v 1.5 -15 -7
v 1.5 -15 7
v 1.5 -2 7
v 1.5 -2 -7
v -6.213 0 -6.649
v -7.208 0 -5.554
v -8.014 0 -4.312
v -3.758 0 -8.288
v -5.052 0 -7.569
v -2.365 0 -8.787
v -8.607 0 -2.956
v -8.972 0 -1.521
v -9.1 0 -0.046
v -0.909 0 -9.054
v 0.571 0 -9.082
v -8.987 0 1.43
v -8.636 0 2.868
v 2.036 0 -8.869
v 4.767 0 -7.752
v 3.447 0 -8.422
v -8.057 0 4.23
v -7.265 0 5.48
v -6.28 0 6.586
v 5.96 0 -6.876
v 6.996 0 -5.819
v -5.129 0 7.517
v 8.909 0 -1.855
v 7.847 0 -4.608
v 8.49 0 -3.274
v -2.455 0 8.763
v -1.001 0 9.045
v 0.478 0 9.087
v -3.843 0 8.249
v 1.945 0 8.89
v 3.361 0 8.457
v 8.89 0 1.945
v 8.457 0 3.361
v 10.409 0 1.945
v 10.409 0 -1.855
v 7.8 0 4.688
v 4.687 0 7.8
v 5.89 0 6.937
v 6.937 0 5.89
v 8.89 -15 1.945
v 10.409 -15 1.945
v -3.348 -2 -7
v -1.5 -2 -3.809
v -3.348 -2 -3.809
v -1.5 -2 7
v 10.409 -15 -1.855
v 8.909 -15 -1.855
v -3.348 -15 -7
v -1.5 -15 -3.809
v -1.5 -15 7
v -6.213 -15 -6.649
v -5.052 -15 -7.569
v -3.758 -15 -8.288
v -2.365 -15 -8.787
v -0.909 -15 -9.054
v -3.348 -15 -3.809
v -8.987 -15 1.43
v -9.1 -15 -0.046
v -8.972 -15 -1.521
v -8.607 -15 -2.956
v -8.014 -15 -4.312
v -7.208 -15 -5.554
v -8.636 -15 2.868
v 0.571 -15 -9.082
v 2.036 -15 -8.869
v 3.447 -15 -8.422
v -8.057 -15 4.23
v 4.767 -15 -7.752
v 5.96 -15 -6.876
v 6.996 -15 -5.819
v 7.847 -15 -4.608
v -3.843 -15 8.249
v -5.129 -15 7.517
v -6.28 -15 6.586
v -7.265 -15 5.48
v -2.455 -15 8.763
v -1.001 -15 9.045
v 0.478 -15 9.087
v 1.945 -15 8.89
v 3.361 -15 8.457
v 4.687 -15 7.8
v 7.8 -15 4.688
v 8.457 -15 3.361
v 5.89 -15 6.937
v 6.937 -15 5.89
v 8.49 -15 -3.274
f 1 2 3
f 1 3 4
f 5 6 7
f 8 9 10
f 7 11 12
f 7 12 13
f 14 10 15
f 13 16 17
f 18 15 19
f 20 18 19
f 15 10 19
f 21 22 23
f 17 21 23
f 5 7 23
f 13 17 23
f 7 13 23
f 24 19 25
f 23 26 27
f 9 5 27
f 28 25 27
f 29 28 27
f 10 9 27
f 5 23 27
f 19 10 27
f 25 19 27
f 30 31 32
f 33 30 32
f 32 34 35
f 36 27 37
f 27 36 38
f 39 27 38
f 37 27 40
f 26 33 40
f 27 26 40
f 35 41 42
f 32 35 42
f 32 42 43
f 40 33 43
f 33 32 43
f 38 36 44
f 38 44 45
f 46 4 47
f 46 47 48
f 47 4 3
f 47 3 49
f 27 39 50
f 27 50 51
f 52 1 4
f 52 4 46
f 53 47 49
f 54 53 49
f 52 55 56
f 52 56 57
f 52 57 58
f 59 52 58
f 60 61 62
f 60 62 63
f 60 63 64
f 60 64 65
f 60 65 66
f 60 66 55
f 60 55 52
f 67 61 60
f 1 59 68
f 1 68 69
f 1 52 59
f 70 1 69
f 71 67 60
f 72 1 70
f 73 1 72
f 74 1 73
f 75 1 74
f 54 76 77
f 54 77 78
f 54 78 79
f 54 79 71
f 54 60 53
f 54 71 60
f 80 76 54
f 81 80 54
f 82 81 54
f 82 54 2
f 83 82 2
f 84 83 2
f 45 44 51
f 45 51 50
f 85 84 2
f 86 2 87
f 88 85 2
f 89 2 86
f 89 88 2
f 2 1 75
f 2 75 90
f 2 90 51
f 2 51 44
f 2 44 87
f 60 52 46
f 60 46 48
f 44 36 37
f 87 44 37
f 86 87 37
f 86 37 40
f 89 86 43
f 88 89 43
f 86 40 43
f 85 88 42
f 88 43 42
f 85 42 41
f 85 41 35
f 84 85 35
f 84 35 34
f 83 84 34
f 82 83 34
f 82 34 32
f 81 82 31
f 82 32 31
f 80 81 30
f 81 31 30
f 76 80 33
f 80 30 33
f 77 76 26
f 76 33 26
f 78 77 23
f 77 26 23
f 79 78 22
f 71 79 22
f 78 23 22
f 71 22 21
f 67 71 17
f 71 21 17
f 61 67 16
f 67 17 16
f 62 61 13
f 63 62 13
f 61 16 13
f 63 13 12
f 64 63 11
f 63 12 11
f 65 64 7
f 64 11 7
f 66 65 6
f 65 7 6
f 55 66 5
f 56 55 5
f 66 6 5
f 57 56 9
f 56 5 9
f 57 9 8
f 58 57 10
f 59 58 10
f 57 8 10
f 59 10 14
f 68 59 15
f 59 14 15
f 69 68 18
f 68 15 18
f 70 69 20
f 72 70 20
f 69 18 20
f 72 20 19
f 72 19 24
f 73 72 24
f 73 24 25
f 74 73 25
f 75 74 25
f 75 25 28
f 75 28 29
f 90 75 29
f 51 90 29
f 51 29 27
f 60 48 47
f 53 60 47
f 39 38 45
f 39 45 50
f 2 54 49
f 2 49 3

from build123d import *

# Parameters (mm, degrees)
PAD_DEPTH    = 15
POCKET_DEPTH = 13


with BuildPart() as part:
    # Sketch → Pad (new body)
    with BuildSketch(Plane.XZ):
        with BuildLine():
            ThreePointArc((8.889624, 1.945402), (-9.099882, -0.046426), (8.90901, -1.854598))
            Line((10.40901, -1.854598), (8.90901, -1.854598))
            Line((10.40901, 1.945402), (10.40901, -1.854598))
            Line((8.889624, 1.945402), (10.40901, 1.945402))
        make_face()
    extrude(amount=PAD_DEPTH)

    # Sketch001 (on Face6 of Pad) → Pocket (cut)
    with BuildSketch(Plane.XZ.offset(15)):
        Polygon((-1.5, 7), (1.5, 7), (1.5, -7), (-3.348355, -7), (-3.348355, -3.808815), (-1.5, -3.808815), align=None)
    extrude(amount=-POCKET_DEPTH, mode=Mode.SUBTRACT)


solid = part.part
